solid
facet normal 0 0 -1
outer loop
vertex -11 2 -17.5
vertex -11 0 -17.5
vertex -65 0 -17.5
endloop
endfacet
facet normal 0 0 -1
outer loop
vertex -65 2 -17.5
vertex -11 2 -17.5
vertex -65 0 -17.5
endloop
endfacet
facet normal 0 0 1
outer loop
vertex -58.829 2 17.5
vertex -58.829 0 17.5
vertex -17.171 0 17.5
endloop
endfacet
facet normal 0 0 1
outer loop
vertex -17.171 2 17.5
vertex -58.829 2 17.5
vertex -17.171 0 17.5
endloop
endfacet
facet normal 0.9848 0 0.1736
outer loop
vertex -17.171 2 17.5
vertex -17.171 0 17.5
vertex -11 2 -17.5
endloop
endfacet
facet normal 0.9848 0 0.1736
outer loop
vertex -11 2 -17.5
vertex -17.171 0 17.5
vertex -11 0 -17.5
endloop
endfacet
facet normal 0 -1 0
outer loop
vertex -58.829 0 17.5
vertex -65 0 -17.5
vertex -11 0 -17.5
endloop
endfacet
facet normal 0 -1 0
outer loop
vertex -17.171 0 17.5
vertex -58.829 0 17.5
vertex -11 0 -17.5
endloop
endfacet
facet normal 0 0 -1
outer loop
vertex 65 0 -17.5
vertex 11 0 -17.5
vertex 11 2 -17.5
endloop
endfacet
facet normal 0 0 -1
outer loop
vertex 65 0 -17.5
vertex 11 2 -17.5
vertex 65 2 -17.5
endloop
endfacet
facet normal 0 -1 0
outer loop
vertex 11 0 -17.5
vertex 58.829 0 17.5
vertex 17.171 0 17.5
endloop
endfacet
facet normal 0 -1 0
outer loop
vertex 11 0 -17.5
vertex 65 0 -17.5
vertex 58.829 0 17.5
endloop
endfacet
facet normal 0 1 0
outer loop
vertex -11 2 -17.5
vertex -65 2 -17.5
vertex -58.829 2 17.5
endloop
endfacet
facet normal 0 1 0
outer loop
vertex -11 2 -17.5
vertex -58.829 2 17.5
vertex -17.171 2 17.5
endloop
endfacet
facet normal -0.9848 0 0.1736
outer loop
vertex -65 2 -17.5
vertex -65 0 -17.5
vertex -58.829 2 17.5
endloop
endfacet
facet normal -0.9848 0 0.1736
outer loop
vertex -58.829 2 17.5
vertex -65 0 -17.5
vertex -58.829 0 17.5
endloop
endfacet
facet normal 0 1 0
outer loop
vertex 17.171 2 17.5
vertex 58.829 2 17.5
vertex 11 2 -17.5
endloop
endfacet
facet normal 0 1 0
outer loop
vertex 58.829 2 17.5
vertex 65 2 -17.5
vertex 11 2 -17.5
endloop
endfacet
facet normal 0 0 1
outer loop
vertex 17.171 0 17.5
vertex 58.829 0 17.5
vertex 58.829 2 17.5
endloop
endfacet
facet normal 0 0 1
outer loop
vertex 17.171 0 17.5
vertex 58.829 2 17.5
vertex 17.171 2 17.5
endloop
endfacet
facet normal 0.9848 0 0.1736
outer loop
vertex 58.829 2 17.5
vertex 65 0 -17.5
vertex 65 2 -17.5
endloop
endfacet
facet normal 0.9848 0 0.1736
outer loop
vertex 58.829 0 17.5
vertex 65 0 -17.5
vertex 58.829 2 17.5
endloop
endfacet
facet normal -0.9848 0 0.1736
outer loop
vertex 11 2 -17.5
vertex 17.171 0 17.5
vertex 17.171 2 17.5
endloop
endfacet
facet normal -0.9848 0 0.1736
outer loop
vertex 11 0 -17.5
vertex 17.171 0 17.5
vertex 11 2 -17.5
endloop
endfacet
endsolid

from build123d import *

# Parameters (mm, degrees)
EXTRUDE_1_DEPTH   = 2
EXTRUDE_1_2_DEPTH = 2


with BuildPart() as part:
    # 草图1 → 凸台-拉伸1 (new body)
    with BuildSketch(Plane(origin=(0, 0, 0), x_dir=(1, 0, 0), z_dir=(0, 1, 0))):
        Polygon((-65, 17.5), (-58.828555675, -17.5), (-17.171444325, -17.5), (-11, 17.5), align=None)
    extrude(amount=EXTRUDE_1_DEPTH)


with BuildPart() as body_2:
    # 草图1 → Extrude 1 2 (new body)
    with BuildSketch(Plane(origin=(0, 0, 0), x_dir=(1, 0, 0), z_dir=(0, 1, 0))):
        Polygon((58.828555675, -17.5), (17.171444325, -17.5), (11, 17.5), (65, 17.5), align=None)
    extrude(amount=EXTRUDE_1_2_DEPTH)


solid = Compound([part.part, body_2.part])
